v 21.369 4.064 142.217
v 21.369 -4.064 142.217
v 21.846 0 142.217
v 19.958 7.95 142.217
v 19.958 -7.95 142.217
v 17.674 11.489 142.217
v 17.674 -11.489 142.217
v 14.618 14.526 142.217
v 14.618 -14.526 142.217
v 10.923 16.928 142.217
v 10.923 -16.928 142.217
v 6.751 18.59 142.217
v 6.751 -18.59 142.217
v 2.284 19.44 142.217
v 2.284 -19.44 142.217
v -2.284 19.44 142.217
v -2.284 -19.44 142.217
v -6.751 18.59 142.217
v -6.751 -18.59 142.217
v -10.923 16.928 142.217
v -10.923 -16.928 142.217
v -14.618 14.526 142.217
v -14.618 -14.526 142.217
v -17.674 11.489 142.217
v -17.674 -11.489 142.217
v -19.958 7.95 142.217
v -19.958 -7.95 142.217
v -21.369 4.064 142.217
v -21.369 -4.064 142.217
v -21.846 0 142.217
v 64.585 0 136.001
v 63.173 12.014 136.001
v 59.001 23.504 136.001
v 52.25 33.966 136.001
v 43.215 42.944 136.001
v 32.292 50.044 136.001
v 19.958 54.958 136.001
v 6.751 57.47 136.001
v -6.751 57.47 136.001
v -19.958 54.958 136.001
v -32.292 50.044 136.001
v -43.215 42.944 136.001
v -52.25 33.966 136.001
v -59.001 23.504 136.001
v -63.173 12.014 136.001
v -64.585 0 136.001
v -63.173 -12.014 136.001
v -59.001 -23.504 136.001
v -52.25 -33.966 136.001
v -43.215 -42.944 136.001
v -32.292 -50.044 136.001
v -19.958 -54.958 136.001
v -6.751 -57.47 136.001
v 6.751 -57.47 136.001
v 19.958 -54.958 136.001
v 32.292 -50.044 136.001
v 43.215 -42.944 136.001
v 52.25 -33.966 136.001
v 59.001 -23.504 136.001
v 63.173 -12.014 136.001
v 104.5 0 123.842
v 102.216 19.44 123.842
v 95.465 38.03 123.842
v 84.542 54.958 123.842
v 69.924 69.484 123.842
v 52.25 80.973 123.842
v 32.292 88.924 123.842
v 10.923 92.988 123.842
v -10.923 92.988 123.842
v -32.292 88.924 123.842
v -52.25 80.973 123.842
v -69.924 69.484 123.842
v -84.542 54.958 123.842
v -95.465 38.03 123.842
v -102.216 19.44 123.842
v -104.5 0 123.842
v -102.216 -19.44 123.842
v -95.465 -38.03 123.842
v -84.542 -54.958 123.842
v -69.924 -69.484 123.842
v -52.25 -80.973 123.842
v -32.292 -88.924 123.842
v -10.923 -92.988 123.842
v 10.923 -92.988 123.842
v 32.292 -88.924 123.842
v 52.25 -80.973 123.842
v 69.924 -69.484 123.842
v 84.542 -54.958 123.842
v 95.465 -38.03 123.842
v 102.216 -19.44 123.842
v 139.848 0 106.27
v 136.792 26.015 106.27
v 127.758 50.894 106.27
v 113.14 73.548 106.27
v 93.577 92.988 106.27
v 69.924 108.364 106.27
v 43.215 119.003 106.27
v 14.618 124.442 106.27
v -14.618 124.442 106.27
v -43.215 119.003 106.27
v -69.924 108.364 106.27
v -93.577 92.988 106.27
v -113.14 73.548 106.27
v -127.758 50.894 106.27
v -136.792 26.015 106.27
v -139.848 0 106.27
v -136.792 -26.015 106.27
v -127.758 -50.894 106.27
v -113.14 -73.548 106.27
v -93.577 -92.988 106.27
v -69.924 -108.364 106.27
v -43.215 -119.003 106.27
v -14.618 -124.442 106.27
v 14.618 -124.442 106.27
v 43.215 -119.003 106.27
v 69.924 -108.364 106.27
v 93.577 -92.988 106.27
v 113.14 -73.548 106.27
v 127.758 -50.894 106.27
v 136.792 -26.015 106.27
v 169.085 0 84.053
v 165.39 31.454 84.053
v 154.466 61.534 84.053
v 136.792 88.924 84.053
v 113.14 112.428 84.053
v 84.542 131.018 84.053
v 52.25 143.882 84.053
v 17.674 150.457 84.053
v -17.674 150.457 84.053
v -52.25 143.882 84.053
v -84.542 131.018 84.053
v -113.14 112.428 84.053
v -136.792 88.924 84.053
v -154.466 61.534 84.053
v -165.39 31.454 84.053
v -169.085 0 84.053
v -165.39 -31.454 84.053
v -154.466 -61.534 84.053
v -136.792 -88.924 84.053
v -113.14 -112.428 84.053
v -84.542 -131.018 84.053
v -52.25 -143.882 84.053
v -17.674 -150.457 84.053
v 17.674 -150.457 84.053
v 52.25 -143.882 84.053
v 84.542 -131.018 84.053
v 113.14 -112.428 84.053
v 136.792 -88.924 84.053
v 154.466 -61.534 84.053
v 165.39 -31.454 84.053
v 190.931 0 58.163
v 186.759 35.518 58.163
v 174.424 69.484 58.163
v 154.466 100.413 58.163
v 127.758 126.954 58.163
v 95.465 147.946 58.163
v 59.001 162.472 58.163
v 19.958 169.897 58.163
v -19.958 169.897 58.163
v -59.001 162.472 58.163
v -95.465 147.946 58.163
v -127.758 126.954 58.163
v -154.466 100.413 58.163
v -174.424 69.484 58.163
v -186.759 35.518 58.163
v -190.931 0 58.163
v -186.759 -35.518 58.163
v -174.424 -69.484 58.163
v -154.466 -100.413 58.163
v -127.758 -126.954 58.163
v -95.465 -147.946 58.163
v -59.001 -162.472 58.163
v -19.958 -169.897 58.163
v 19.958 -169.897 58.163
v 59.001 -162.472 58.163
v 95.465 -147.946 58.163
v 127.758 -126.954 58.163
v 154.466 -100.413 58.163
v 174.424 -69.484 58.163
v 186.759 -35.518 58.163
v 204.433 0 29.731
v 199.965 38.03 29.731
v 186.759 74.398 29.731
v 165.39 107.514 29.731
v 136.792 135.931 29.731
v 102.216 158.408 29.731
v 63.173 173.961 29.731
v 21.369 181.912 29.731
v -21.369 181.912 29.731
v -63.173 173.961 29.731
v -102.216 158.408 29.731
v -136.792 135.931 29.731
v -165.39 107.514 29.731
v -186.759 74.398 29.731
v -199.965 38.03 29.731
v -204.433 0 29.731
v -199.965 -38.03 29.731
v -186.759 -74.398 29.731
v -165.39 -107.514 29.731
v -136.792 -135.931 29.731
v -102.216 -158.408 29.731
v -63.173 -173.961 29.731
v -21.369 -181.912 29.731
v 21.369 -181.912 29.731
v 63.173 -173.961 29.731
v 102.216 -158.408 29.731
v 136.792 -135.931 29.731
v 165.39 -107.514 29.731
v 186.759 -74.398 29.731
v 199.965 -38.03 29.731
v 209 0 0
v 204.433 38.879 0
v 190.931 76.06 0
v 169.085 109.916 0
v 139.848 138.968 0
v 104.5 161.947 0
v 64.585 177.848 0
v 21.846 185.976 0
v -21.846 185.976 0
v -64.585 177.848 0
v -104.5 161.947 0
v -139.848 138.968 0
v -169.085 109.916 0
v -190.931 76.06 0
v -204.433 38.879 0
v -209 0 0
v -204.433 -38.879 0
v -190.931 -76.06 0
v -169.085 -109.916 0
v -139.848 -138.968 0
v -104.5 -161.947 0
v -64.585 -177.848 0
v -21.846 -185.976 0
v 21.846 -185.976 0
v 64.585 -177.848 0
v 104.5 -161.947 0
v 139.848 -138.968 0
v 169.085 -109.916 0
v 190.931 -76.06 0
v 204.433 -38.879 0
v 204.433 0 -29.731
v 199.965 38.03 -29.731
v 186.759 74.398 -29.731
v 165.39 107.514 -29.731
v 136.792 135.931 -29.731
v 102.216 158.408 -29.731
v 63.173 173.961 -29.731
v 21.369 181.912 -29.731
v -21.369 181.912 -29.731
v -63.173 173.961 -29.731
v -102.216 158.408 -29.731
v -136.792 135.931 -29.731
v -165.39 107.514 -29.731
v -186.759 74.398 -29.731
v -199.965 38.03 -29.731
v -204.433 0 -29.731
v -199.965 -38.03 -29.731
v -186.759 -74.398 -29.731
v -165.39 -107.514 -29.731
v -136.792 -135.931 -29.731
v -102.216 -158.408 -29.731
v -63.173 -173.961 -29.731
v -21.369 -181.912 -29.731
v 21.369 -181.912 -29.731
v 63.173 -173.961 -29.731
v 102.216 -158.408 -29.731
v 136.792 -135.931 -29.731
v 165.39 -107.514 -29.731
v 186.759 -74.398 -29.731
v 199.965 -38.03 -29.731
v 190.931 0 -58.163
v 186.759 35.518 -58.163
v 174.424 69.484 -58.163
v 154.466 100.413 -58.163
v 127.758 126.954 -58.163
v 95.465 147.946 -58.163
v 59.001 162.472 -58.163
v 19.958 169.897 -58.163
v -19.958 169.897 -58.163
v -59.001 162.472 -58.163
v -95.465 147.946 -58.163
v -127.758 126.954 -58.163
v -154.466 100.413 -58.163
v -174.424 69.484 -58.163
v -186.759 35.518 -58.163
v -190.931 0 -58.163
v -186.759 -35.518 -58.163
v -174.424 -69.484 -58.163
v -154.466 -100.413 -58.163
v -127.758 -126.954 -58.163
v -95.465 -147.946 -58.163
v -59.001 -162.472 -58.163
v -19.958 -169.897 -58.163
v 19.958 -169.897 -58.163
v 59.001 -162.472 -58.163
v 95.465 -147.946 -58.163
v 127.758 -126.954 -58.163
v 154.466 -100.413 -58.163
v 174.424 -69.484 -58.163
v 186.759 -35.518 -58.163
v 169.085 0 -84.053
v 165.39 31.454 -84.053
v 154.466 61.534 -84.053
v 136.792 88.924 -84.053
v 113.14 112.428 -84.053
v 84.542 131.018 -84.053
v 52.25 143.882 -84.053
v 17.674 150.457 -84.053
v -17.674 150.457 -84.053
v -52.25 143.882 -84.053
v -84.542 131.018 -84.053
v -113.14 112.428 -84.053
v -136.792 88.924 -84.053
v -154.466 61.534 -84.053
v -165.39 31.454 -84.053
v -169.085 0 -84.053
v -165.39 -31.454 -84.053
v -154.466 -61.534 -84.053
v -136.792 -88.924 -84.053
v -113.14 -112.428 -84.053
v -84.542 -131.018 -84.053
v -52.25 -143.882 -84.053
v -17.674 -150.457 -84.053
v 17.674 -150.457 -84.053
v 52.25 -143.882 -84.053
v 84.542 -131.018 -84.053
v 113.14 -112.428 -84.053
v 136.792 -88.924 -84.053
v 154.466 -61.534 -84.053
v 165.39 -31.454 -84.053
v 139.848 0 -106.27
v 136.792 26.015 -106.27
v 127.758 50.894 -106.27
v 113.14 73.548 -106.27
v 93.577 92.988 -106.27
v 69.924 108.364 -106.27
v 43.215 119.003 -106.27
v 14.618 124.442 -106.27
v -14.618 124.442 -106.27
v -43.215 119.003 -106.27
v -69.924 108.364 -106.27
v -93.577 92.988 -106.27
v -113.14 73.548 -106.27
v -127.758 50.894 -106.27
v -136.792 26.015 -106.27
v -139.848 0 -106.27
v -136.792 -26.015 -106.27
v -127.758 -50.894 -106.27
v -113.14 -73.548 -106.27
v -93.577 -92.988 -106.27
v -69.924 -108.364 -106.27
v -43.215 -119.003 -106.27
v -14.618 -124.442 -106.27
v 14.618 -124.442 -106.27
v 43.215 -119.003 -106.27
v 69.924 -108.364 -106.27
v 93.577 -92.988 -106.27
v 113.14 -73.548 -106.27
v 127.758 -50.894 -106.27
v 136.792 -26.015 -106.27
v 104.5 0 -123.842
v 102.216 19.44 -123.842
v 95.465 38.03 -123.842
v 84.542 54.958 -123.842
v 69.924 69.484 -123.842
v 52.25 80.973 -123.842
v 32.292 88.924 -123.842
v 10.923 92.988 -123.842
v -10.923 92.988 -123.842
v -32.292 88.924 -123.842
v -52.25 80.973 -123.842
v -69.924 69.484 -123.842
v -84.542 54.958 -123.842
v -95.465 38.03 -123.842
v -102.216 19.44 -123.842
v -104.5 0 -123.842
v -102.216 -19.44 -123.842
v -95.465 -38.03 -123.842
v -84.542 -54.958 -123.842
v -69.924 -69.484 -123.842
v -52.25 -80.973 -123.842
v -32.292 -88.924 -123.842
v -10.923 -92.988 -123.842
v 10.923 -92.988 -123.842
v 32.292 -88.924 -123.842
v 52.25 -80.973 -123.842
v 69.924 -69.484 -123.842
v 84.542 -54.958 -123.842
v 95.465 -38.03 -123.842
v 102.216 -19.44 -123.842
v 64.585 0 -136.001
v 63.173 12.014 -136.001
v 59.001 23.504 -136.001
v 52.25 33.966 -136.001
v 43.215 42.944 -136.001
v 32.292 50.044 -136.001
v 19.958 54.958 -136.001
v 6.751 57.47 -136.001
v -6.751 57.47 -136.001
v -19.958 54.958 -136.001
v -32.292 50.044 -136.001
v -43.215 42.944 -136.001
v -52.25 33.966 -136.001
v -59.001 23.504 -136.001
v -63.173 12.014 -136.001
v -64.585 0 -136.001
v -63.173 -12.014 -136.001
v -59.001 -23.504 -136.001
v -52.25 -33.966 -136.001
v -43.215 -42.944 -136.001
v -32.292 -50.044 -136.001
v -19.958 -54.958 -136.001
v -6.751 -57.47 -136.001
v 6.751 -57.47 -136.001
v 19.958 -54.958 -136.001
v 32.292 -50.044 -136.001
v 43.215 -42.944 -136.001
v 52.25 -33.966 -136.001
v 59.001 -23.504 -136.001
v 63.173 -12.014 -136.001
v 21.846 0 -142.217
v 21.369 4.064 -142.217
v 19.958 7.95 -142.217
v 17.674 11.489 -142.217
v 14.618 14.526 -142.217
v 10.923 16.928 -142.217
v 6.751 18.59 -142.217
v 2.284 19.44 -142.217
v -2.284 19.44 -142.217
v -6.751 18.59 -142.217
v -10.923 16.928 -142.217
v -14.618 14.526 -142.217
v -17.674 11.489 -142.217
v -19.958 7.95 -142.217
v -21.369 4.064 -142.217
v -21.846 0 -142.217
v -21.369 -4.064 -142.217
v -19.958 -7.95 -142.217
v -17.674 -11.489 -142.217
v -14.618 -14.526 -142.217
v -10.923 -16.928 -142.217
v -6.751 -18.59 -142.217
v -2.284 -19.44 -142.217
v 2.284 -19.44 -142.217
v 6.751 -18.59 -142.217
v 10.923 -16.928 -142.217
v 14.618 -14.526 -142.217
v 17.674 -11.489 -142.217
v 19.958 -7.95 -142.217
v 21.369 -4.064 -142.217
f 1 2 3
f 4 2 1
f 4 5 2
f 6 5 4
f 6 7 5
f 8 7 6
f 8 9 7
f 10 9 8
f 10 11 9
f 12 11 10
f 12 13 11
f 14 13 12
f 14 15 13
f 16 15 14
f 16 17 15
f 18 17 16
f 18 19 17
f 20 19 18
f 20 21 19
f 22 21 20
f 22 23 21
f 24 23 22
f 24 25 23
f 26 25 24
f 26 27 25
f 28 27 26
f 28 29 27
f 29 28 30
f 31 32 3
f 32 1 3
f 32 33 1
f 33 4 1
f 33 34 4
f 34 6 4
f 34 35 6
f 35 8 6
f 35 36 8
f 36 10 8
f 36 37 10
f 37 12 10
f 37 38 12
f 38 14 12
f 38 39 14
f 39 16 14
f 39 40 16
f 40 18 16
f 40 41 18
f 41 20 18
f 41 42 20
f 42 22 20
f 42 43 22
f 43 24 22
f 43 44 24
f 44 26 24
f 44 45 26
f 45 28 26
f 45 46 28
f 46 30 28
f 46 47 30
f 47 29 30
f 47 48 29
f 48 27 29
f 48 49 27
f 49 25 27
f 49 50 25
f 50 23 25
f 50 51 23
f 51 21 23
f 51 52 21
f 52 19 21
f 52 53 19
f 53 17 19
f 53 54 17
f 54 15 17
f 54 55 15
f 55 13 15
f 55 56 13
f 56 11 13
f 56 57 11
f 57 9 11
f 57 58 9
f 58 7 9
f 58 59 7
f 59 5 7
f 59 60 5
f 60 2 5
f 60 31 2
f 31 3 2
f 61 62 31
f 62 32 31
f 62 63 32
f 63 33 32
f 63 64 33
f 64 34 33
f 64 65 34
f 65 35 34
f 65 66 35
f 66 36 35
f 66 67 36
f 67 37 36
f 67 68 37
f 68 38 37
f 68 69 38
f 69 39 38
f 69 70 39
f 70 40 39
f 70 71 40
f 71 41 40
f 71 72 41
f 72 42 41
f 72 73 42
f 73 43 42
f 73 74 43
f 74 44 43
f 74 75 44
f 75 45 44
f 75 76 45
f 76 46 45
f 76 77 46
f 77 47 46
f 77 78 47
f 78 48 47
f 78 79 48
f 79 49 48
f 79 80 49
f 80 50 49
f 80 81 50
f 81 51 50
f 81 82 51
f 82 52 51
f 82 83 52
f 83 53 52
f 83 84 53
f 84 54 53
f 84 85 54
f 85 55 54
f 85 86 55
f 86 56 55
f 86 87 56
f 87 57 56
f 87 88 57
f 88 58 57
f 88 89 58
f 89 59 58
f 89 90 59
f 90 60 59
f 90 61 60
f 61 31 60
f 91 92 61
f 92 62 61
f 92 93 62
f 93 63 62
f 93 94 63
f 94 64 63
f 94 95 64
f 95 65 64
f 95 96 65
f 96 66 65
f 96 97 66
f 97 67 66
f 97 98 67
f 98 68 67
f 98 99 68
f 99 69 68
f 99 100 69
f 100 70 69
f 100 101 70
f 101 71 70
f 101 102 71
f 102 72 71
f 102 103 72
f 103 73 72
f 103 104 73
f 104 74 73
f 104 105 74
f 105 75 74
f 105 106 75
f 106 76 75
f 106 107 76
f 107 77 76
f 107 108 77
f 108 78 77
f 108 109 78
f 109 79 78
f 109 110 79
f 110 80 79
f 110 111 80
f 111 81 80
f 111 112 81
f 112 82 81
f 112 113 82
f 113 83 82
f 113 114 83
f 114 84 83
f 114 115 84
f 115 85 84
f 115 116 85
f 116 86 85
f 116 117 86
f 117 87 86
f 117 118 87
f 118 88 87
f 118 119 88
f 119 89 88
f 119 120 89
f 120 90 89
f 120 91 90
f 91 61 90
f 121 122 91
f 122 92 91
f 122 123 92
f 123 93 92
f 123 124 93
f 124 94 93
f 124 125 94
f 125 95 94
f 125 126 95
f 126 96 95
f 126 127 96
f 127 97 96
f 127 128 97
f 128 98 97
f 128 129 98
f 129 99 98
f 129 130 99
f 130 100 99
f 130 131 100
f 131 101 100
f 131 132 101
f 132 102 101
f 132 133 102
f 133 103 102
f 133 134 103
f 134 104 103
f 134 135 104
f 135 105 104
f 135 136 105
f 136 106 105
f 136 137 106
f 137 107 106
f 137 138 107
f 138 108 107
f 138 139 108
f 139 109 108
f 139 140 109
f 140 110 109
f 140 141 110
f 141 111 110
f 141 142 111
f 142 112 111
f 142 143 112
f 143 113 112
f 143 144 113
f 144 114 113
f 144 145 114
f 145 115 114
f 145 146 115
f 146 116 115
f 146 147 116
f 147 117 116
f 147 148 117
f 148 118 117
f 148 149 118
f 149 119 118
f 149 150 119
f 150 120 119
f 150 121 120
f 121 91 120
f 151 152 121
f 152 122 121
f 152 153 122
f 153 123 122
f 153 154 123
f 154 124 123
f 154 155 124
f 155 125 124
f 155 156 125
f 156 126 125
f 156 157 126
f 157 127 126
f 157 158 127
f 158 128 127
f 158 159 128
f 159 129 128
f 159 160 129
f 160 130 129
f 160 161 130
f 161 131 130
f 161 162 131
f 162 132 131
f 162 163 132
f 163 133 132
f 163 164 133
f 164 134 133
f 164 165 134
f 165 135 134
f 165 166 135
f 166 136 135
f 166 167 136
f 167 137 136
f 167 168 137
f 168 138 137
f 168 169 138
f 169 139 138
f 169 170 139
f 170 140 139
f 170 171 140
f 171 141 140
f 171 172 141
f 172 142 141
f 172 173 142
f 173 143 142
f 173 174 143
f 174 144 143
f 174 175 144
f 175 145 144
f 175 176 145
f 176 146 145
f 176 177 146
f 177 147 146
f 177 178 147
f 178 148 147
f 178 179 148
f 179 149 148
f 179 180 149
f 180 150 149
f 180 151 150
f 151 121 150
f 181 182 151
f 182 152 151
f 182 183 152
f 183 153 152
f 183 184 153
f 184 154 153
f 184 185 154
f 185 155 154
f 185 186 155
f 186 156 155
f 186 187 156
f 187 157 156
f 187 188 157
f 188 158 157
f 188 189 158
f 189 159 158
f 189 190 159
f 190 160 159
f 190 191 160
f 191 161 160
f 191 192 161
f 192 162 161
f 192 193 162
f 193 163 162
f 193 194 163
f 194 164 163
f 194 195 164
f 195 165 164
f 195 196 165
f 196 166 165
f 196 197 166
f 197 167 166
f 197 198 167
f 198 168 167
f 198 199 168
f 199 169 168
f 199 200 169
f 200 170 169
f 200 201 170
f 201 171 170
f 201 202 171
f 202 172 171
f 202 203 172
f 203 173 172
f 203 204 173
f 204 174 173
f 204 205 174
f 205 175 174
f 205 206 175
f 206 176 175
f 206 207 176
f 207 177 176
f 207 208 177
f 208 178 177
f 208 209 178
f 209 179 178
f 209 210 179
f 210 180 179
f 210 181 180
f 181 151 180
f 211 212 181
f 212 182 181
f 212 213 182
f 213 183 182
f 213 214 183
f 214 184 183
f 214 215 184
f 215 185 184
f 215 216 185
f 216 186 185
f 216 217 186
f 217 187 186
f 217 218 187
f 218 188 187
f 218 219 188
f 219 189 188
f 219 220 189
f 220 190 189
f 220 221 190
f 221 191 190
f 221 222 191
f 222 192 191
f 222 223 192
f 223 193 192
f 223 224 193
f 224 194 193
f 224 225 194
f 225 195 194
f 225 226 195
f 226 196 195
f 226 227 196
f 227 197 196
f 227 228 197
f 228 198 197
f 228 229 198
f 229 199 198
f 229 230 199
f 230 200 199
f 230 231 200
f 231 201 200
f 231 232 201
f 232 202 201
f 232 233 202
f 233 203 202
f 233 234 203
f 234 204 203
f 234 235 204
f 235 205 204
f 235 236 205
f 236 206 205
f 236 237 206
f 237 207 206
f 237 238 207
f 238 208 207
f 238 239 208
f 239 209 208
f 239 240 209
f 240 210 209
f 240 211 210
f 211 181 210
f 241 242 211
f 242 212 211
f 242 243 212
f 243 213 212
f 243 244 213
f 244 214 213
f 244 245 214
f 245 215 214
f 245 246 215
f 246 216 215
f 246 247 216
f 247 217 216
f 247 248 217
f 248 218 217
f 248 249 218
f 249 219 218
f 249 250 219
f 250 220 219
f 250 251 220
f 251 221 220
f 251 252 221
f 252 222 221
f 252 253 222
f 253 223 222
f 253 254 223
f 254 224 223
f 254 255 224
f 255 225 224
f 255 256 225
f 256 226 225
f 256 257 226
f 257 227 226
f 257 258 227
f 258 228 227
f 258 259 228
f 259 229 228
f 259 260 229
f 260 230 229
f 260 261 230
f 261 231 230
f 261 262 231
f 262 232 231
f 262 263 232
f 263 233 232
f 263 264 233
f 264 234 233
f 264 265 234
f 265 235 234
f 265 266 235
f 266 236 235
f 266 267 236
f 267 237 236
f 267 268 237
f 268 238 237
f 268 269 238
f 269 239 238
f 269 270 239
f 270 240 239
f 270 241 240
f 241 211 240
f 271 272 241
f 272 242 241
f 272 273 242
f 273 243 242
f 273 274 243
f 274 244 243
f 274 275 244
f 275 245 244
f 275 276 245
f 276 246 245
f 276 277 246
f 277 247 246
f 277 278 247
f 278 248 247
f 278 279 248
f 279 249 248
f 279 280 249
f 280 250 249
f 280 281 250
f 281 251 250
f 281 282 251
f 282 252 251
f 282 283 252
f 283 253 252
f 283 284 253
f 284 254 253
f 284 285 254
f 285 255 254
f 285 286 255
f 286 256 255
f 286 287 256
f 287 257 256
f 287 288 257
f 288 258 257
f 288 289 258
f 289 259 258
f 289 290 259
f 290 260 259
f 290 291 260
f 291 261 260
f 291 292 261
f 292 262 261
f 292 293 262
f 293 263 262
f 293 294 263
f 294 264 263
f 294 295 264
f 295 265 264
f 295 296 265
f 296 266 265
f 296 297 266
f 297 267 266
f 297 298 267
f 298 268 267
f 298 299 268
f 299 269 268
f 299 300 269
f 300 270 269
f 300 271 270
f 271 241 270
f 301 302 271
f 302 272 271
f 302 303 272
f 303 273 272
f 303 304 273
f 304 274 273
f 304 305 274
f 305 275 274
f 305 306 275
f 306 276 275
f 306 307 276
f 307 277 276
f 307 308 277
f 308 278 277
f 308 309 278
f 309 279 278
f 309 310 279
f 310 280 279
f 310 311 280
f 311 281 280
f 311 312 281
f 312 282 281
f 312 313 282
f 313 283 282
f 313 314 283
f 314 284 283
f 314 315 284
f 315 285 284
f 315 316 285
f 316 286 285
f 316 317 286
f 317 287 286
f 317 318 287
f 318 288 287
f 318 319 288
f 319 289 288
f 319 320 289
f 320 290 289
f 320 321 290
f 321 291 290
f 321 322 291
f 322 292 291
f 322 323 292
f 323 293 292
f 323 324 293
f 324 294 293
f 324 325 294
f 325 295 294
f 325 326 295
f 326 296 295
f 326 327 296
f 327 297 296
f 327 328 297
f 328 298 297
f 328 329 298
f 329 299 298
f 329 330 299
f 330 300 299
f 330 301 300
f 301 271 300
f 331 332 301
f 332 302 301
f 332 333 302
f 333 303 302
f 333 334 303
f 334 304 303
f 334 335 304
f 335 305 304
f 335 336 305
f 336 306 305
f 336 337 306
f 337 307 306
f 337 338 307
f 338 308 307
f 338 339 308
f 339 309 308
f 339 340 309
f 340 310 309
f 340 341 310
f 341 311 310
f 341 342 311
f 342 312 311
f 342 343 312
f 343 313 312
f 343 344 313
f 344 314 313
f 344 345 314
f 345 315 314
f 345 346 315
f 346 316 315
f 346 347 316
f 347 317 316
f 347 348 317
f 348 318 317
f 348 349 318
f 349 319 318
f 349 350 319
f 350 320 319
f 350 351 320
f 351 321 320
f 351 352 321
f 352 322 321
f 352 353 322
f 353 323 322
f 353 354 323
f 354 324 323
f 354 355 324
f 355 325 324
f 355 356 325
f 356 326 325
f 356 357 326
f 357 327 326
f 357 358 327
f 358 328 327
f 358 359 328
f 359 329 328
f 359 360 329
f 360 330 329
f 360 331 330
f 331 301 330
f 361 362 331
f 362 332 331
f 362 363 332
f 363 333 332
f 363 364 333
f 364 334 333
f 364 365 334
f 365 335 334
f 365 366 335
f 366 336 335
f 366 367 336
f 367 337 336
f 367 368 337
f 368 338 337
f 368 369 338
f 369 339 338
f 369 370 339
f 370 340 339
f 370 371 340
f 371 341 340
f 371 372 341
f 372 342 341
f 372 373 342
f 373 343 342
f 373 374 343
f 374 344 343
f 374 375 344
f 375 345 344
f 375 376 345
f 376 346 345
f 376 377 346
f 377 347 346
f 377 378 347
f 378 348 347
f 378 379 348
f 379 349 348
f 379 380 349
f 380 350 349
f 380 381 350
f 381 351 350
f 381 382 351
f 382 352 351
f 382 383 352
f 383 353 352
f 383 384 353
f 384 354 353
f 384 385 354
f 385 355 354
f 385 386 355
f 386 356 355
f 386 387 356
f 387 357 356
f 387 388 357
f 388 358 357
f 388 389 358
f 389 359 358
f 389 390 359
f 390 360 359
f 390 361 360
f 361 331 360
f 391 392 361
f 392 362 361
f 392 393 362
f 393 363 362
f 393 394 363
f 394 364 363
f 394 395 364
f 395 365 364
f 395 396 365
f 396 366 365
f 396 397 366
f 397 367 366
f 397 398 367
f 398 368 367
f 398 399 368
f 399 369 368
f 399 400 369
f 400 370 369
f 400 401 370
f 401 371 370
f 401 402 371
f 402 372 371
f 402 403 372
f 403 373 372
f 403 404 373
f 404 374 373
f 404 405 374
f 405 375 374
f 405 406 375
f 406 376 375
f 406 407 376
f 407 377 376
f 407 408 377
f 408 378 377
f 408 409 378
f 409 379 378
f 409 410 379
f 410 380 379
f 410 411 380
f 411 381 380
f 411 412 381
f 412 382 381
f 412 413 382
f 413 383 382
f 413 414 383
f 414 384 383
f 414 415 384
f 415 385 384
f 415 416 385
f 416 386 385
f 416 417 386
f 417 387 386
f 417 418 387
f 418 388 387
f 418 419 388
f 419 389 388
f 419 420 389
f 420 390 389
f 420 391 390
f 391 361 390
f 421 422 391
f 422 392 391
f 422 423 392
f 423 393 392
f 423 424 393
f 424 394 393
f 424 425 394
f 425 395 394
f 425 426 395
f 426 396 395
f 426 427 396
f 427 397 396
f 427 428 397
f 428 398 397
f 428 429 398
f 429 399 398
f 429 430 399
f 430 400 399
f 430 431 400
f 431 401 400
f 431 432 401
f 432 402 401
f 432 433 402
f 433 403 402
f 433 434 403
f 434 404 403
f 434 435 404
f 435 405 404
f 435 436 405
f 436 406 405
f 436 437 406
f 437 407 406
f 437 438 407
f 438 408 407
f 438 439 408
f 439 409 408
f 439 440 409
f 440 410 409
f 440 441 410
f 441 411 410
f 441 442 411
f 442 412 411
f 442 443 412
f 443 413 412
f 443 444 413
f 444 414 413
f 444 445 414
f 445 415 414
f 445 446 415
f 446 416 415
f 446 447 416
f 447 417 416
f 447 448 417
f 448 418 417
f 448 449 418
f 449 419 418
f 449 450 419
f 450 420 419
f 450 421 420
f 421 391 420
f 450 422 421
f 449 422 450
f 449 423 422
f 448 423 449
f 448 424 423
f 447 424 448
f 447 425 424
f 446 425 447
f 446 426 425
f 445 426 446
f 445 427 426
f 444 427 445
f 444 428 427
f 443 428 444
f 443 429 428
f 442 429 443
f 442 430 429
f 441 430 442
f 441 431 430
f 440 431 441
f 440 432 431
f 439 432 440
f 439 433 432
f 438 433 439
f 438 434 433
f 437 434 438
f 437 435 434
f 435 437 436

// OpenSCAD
// Generated by SolidPython 1.0.1 on 2020-07-29 00:46:54


scale(v = [19, 17, 13]) {
	sphere(r = 11);
}
/***********************************************
*********      SolidPython code:      **********
************************************************
 
# import packages: SolidPython
from solid import *
from solid.utils import *
from itertools import chain, combinations, permutations


class Resize:

    def __init__(self, scad_file):
        self.scad_file = scad_file
        #self.scad_file = import_scad(scad_file)
        # cone/cylinder param:
        self.r1 = 0
        self.r2 = 0
        self.h = 0
        # rectangular prism param:
        self.w = 0
        self.l = 0
        # ellipse param:
        self.r = 0

    # import OpenScad code (file name corresponds to shape)


    # classify shape + parameters
    def assign(self, param1, param2, param3):
        if self.scad_file == 'cone.scad':
            self.r1 = param1
            self.r2 = param2
            self.h = param3
        elif self.scad_file == 'cylinder.scad':
            self.r1 = param1
            self.r2 = param2
            self.h = param3
        elif self.scad_file == 'rectangularPrism.scad':
            self.h = param1
            self.l = param2
            self.w = param3
        else:
            self.r = param1
            self.h = param2

    # resize parameters
    def iterate(self):
        x = range(3, 20, 2)
        i = 1
        if self.scad_file == 'cone.scad':
            tempList = list(permutations(x, 2))
            for temp in tempList:
                param1 = temp[0]
                param2 = temp[1]
                filepath = 'produced_scad_files/' + 'cone' + str(param1) + '_' + str(param2) + '_' + '.scad'
                scad_render_to_file(cylinder(h=param1, r1=param2, r2=0), filepath)

        elif self.scad_file == 'cylinder.scad':
            tempList = list(permutations(x, 3))
            for temp in tempList:
                param1 = temp[0]
                param2 = temp[1]
                filepath = 'produced_scad_files/' + 'cylinder' + str(param1) + '_' + str(param2) + '_' + '.scad'
                scad_render_to_file(cylinder(h=param1, r1=param2, r2=param2), filepath)

        elif self.scad_file == 'rectangularPrism.scad':
            tempList = list(permutations(x, 3))
            for temp in tempList:
                param1 = temp[0]
                param2 = temp[1]
                param3 = temp[2]
                filepath = 'produced_scad_files/' + 'rectangularPrism' + str(param1) + '_' + str(param2) + '_' + str(
                    param3) + '.scad'
                scad_render_to_file(cube(size=(param1, param2, param3)), filepath)

        elif self.scad_file == 'ellipse.scad':
            tempList = list(permutations(x, 4))
            for temp in tempList:
                param1 = temp[0]
                param2 = temp[1]
                param3 = temp[2]
                param4 = temp[3]
                filepath = 'produced_scad_files/' + 'ellipse' + str(param1) + '_' + str(param2) + '_' + str(param3) + '_' + str(param4) + '.scad'
                scad_render_to_file(scale([param1, param2, param3])(sphere(r=param4)), filepath)

    def render_to_scadfile(self):
        scad_render_to_file(scad, 'example.scad') 
 
************************************************/
